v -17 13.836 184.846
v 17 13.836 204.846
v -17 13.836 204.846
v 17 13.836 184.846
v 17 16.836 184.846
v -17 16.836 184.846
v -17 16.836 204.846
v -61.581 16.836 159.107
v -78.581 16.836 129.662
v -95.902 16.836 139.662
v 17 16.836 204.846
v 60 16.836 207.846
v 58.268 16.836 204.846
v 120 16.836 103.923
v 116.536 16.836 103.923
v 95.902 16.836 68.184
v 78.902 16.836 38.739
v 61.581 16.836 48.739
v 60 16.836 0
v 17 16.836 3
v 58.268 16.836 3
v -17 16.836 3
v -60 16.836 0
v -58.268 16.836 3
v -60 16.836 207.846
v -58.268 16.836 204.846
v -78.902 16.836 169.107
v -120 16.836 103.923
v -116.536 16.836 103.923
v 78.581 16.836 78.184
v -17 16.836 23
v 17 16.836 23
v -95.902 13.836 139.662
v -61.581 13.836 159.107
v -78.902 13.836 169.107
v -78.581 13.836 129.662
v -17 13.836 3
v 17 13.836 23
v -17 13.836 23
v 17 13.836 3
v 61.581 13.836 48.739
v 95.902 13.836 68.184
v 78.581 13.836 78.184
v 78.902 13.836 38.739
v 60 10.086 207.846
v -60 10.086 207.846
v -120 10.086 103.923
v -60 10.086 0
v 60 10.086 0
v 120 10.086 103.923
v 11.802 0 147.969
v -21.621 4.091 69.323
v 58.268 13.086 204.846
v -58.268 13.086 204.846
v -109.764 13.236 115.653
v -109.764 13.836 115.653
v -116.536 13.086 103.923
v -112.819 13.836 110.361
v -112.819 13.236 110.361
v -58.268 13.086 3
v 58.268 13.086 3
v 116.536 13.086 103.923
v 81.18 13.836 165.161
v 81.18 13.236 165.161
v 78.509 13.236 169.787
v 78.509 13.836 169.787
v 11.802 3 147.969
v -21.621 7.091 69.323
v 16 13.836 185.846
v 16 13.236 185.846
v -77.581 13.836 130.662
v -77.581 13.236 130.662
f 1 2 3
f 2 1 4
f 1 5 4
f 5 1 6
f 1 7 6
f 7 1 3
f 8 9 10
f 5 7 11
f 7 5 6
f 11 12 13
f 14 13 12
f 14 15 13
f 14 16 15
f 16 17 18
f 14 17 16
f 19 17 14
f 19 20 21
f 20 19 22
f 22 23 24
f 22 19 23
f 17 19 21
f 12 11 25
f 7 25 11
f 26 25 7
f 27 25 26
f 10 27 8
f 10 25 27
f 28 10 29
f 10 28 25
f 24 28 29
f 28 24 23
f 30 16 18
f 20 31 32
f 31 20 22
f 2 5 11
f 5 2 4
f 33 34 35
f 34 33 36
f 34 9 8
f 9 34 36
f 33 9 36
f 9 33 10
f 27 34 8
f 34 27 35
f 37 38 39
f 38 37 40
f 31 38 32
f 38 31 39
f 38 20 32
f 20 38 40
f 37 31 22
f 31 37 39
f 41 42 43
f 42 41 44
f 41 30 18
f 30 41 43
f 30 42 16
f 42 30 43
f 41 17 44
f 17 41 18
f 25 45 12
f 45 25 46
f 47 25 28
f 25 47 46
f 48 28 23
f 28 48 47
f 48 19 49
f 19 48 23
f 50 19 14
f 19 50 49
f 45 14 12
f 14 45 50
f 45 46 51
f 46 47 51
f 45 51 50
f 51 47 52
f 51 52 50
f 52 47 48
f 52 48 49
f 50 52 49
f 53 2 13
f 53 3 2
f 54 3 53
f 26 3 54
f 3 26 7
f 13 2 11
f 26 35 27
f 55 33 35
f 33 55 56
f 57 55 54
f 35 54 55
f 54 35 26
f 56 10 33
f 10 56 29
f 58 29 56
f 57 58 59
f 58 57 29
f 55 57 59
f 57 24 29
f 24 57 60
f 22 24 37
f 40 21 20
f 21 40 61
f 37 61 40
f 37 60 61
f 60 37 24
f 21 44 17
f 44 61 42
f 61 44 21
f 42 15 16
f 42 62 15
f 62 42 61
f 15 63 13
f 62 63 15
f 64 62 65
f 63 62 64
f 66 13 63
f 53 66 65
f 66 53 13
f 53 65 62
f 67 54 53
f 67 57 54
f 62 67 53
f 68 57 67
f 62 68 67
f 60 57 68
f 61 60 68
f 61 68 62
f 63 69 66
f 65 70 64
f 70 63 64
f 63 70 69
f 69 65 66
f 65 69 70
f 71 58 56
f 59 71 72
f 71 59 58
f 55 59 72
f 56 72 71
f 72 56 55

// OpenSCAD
/*
    parametric_faceted_hex_wall_tile_mount_v38_original_tabs_hidden_webs.scad
    ------------------------------------------------------------
    Improved asymmetric low-poly hex wall tile.

    Major v22 changes
    -----------------
    1. ONE master thickness control drives the whole part:
       master_thickness_mm

    2. FIXED mounting tabs showing through the front face.
       - edge height now automatically provides enough cavity depth
         for the full mounting-pad thickness
       - mounting tabs and ribs are also clipped against a safe volume
         below the underside of the faceted front shell
       - tabs therefore remain hidden inside the tile


       It controls:
       - faceted front shell thickness
       - perimeter wall thickness
       - mounting-tab thickness

       Optional multipliers allow advanced tuning without hiding the
       master control.

    2. Thicker shells now work automatically.
       The effective edge height is automatically raised when required
       so shell_thickness_mm is never blocked by a too-small edge height.

    3. Mounting pads cannot protrude outside the hexagon.
       Pads are intersected with a smaller inset hex footprint.

    4. Stronger default mounting geometry.
       - 3.0 mm pad thickness
       - 4.0 mm shell overlap
       - 3.0 mm edge inset
       - optional reinforcing ribs

    5. Open back remains truly open.
       There is no rear floor across the middle.

    Recommended use
    ---------------
    For a 9-inch decorative wall tile printed vertically:

        master_thickness_mm        = 3.0;
        front_shell_multiplier      = 1.0;
        perimeter_multiplier        = 1.0;
        mount_pad_multiplier        = 1.0;
        mount_pad_overlap_mm        = 4.0;
        mount_pad_edge_inset_mm     = 3.0;
        add_mount_ribs              = true;

    Export
    ------
    F6 Render
    File -> Export -> Export as STL
*/


// =============================================================================
// CUSTOMIZER PARAMETERS
// =============================================================================


/* [Tile Size] */

// Which dimension tile_size represents.
size_reference = "across_corners";   // [flat_to_flat, across_corners]

// Units for tile_size.
size_units = "mm";                   // [mm, in]

// Examples:
// 152.4 = 6"
// 203.2 = 8"
// 228.6 = 9"
// 254.0 = 10"
tile_size = 240.0;

// Rotate finished tile around Z.
tile_rotation_deg = 15;


/* [Export / Print Orientation] */

// "flat"     = original CAD orientation.
// "vertical" = stand the tile on one complete flat hex side.
export_orientation = "vertical";          // [flat, vertical]

// Finished face uses 15 degrees. Adding another 15 degrees before standing
// gives an effective 30-degree regular-hex orientation, so a COMPLETE FLAT
// SIDE rests on the build plate.
vertical_edge_angle_deg = 15;


/* [Original Sticky Pads + Hidden Support Webs] */

// Keep the clean original v22-style four adhesive pads.
use_original_sticky_pads = true;

// Add a very thin support web from the perimeter wall up to each elevated pad.
// The web stays inside the cavity and is intended to be visually unobtrusive.
add_hidden_pad_support_webs = true;

// Web thickness in final print Y.
// 0.60 mm = roughly 1-2 extrusion lines, easy to remove if desired.
hidden_web_thickness_mm = 0.60;

// Web width in final print X near the pad.
hidden_web_width_mm = 4.0;

// Vertical drop below each pad to anchor into already-printing perimeter wall.
hidden_web_drop_mm = 18.0;

// Overlap into the mounting pad to guarantee a fused connection.
hidden_web_pad_overlap_mm = 1.0;




/* [MASTER THICKNESS] */

// MASTER MATERIAL THICKNESS.
//
// THIS is the main control to use if you want the whole printed part
// physically thicker / stronger.
//
// It directly drives:
//   - faceted front shell thickness
//   - perimeter wall thickness
//   - mounting pad thickness
//
// Recommended:
//   1.6 = light
//   2.0 = medium
//   2.5 = strong
//   3.0 = very strong / recommended for a robust wall tile
//   3.5 = heavy duty
//
master_thickness_mm = 3.0;

// Optional multipliers.
//
// Leave these at 1.0 unless you deliberately want one area stronger
// than the master value.
//
// Example:
// perimeter_multiplier = 1.20 makes a 3.0 mm master produce a
// 3.6 mm perimeter.
front_shell_multiplier = 1.0;
perimeter_multiplier   = 1.0;
mount_pad_multiplier   = 1.0;

// Derived thicknesses are calculated later from the master control.


/* [Front Relief] */

// proportional = scales with tile size
// absolute     = exact millimeter heights below
relief_height_mode = "proportional";    // [proportional, absolute]

// Overall relief multiplier.
relief_scale = 1.0;

// Main peak height relative to flat-to-flat size.
peak_height_ratio = 0.081;

// Ridge height relative to peak.
ridge_to_peak_ratio = 0.757;

// Requested outer edge height relative to peak.
//
// IMPORTANT:
// v21 automatically raises edge height if necessary to fit the selected
// front shell thickness. You normally do NOT need to change this anymore.
edge_to_peak_ratio = 0.097;

// Absolute values, used only in absolute mode.
peak_height_mm  = 18.5;
ridge_height_mm = 14.0;
edge_height_mm  = 1.8;

// Minimum empty clearance between the inner roof and Z=0 at the perimeter.
//
// v20 uses:
// effective_edge_height >= front_shell_thickness_mm + edge_clearance_mm
edge_clearance_mm = 0.60;


/* [Facet Layout] */

// Direction of main peak, CCW from +X.
peak_angle_deg = 45;

// Peak distance from center as a fraction of circumradius.
peak_radius_ratio = 0.38;

// Direction of secondary ridge.
ridge_angle_deg = 208;

// Ridge radial position.
ridge_radius_ratio = 0.34;


/* [Wall Mounting] */

// Enable mounting pads.
add_mount_pads = true;

// Width of each pad parallel to the corresponding hex side.
mount_pad_width_mm = 34.0;

// Radial depth of each pad.
mount_pad_depth_mm = 24.0;

// Mounting-tab thickness is now driven by master_thickness_mm.
// Use mount_pad_multiplier above only if the tabs need to be thicker
// or thinner than the rest of the tile.

// How far the pad reaches beneath the inner perimeter shell.
//
// More overlap creates a stronger pad-to-rim union.
mount_pad_overlap_mm = 4.0;

// Pull the ENTIRE usable pad footprint inward from the outside hex edge.
//
// Pads are clipped against this inset hex, so they cannot protrude outside.
mount_pad_edge_inset_mm = 2.0;

// Minimum air gap between the TOP of mounting geometry and the
// UNDERSIDE of the faceted front shell.
//
// This prevents tabs/ribs from becoming visible through the face.
// Recommended: 0.50-1.00 mm.
mount_face_clearance_mm = 0.75;

// Directions of mounting pads.
mount_pad_angles = [60, 120, 240, 300];


/* [Mount Reinforcement] */

// Add small triangular reinforcing ribs where pads meet the perimeter.
//
// Recommended ON for vertical printing.
add_mount_ribs = false;

// Rib thickness across the pad.
mount_rib_width_mm = 3.0;

// Rib height into the cavity.
mount_rib_height_mm = 5.0;

// Rib radial depth.
mount_rib_depth_mm = 8.0;


/* [Optional Screw Holes] */

add_pad_screw_holes = false;

// 3.5 ~= #6
// 4.5 ~= #8
pad_screw_hole_diameter_mm = 4.5;


/* [Advanced] */

// Polyhedron preview hint.
polyhedron_convexity = 12;

// Cylinder quality for screw holes.
screw_hole_fn = 40;


// =============================================================================
// DERIVED MATERIAL THICKNESSES
// =============================================================================
//
// These are the ACTUAL thicknesses used by the model.
//

front_shell_thickness_mm =
    master_thickness_mm * front_shell_multiplier;

perimeter_wall_thickness_mm =
    master_thickness_mm * perimeter_multiplier;

mount_pad_thickness_mm =
    master_thickness_mm * mount_pad_multiplier;


// =============================================================================
// DERIVED TILE DIMENSIONS
// =============================================================================

_tile_size_mm =
    size_units == "in"
        ? tile_size * 25.4
        : tile_size;

tile_flat_to_flat =
    size_reference == "flat_to_flat"
        ? _tile_size_mm
        : _tile_size_mm * cos(30);

tile_across_corners =
    tile_flat_to_flat / cos(30);

outer_apothem =
    tile_flat_to_flat / 2;

r_outer =
    outer_apothem / cos(30);

inner_apothem =
    outer_apothem - perimeter_wall_thickness_mm;

r_inner =
    inner_apothem / cos(30);

inner_flat_length =
    2 * inner_apothem * tan(30);

hex_side_length =
    2 * r_outer * sin(30);


// =============================================================================
// DERIVED VERTICAL-PRINT GEOMETRY
// =============================================================================

vertical_total_rotation_deg =
    tile_rotation_deg + vertical_edge_angle_deg;

vertical_half_y =
    max([
        for (i = [0 : 5])
            abs(
                r_outer
                * sin(
                    30
                    + i * 60
                    + vertical_total_rotation_deg
                )
            )
    ]);

vertical_print_height =
    2 * vertical_half_y;


function vertical_hex_half_width_at_z(z_mm) =
    let(
        zc = min(max(z_mm, 0), vertical_print_height),
        dz = min(zc, vertical_print_height - zc)
    )
    hex_side_length / 2 + dz / tan(60);

// Final-print X/Z position of a raw legacy mount-pad corner.
function legacy_pad_print_corner(angle_deg, radial_r, lateral_t) =
    let(
        theta =
            angle_deg
            + tile_rotation_deg
            + vertical_edge_angle_deg
    )
    [
        radial_r * cos(theta) - lateral_t * sin(theta),

        vertical_half_y
            + radial_r * sin(theta)
            + lateral_t * cos(theta)
    ];

function legacy_pad_print_corners(angle_deg) =
    [
        legacy_pad_print_corner(
            angle_deg,
            mount_pad_inner_r,
            -mount_pad_width_mm / 2
        ),
        legacy_pad_print_corner(
            angle_deg,
            mount_pad_inner_r,
             mount_pad_width_mm / 2
        ),
        legacy_pad_print_corner(
            angle_deg,
            mount_pad_desired_outer_r,
            -mount_pad_width_mm / 2
        ),
        legacy_pad_print_corner(
            angle_deg,
            mount_pad_desired_outer_r,
             mount_pad_width_mm / 2
        )
    ];

function legacy_pad_corner_zs(angle_deg) =
    [
        for (p = legacy_pad_print_corners(angle_deg))
            p[1]
    ];

function legacy_pad_lowest_z(angle_deg) =
    min(legacy_pad_corner_zs(angle_deg));

function legacy_pad_lowest_index(angle_deg) =
    search(
        legacy_pad_lowest_z(angle_deg),
        legacy_pad_corner_zs(angle_deg)
    )[0];

function legacy_pad_lowest_x(angle_deg) =
    legacy_pad_print_corners(angle_deg)[
        legacy_pad_lowest_index(angle_deg)
    ][0];



// =============================================================================
// DERIVED RELIEF HEIGHTS
// =============================================================================

_peak_unscaled =
    relief_height_mode == "proportional"
        ? tile_flat_to_flat * peak_height_ratio
        : peak_height_mm;

_ridge_unscaled =
    relief_height_mode == "proportional"
        ? _peak_unscaled * ridge_to_peak_ratio
        : ridge_height_mm;

_requested_edge_unscaled =
    relief_height_mode == "proportional"
        ? _peak_unscaled * edge_to_peak_ratio
        : edge_height_mm;

peak_height =
    _peak_unscaled * relief_scale;

ridge_height =
    _ridge_unscaled * relief_scale;

requested_edge_height =
    _requested_edge_unscaled * relief_scale;

// AUTO-FIX:
// Guarantee enough vertical room for BOTH:
//   1. the chosen front-shell thickness
//   2. the full mounting-pad thickness
//
// This is the key v22 fix for tabs previously breaking through the face.
minimum_edge_height =
    front_shell_thickness_mm
    + mount_pad_thickness_mm
    + mount_face_clearance_mm;

edge_height =
    max(
        requested_edge_height,
        minimum_edge_height
    );


// =============================================================================
// DERIVED MOUNTING GEOMETRY
// =============================================================================

// Desired outer edge before clipping.
//
// This allows the pad to overlap the inner wall structurally.
mount_pad_desired_outer_r =
    inner_apothem + mount_pad_overlap_mm;

mount_pad_inner_r =
    mount_pad_desired_outer_r - mount_pad_depth_mm;

mount_pad_center_r =
    mount_pad_desired_outer_r - mount_pad_depth_mm / 2;

// Smaller hex used as a hard clipping boundary.
//
// Any mount geometry outside this boundary is removed automatically.
mount_clip_apothem =
    outer_apothem - mount_pad_edge_inset_mm;

mount_clip_radius =
    mount_clip_apothem / cos(30);


// =============================================================================
// VALIDATION
// =============================================================================

assert(
    tile_flat_to_flat > 0,
    "tile_size must produce a positive tile dimension."
);

assert(
    master_thickness_mm > 0,
    "master_thickness_mm must be greater than zero."
);

assert(
    front_shell_multiplier > 0 &&
    perimeter_multiplier > 0 &&
    mount_pad_multiplier > 0,
    "All thickness multipliers must be greater than zero."
);

assert(
    front_shell_thickness_mm > 0,
    "front_shell_thickness_mm must be greater than zero."
);

assert(
    perimeter_wall_thickness_mm > 0,
    "perimeter_wall_thickness_mm must be greater than zero."
);

assert(
    perimeter_wall_thickness_mm < outer_apothem,
    "perimeter_wall_thickness_mm is too large for this tile."
);

assert(
    inner_apothem > 0,
    "The selected perimeter wall leaves no hollow interior."
);

assert(
    edge_height > front_shell_thickness_mm,
    "Internal error: edge_height must exceed front_shell_thickness_mm."
);

assert(
    ridge_height > edge_height,
    "ridge_height must remain greater than the effective edge height."
);

assert(
    peak_height > ridge_height,
    "peak_height must remain greater than ridge_height."
);

assert(
    peak_radius_ratio > 0 && peak_radius_ratio < 0.90,
    "peak_radius_ratio must be between 0 and 0.90."
);

assert(
    ridge_radius_ratio > 0 && ridge_radius_ratio < 0.90,
    "ridge_radius_ratio must be between 0 and 0.90."
);

assert(
    mount_pad_width_mm > 0,
    "mount_pad_width_mm must be greater than zero."
);

assert(
    mount_pad_depth_mm > 0,
    "mount_pad_depth_mm must be greater than zero."
);

assert(
    mount_pad_thickness_mm > 0,
    "mount_pad_thickness_mm must be greater than zero."
);

assert(
    mount_pad_overlap_mm >= 0,
    "mount_pad_overlap_mm cannot be negative."
);

assert(
    mount_pad_edge_inset_mm >= 0,
    "mount_pad_edge_inset_mm cannot be negative."
);

assert(
    mount_face_clearance_mm >= 0,
    "mount_face_clearance_mm cannot be negative."
);

assert(
    mount_clip_apothem > 0,
    "mount_pad_edge_inset_mm is too large."
);

assert(
    mount_pad_inner_r > 0,
    "mount_pad_depth_mm is too large and reaches/passes the tile center."
);

assert(
    !add_pad_screw_holes ||
    pad_screw_hole_diameter_mm < mount_pad_width_mm * 0.75,
    "pad_screw_hole_diameter_mm is too large for the mounting pad."
);

assert(
    !add_mount_ribs ||
    mount_rib_height_mm > 0,
    "mount_rib_height_mm must be greater than zero."
);


assert(
    hidden_web_thickness_mm > 0,
    "hidden_web_thickness_mm must be greater than zero."
);

assert(
    hidden_web_width_mm > 0,
    "hidden_web_width_mm must be greater than zero."
);

assert(
    hidden_web_drop_mm > 0,
    "hidden_web_drop_mm must be greater than zero."
);


// =============================================================================
// DIAGNOSTIC OUTPUT
// =============================================================================

echo("====================================================");
echo("FACETED HEX WALL TILE v22");
echo("====================================================");

echo(str("flat-to-flat             : ", tile_flat_to_flat, " mm"));
echo(str("across-corners           : ", tile_across_corners, " mm"));
echo(str("hex side length          : ", hex_side_length, " mm"));

echo(str("MASTER thickness         : ", master_thickness_mm, " mm"));
echo(str("actual front shell       : ", front_shell_thickness_mm, " mm"));
echo(str("actual perimeter wall    : ", perimeter_wall_thickness_mm, " mm"));
echo(str("actual mount pad         : ", mount_pad_thickness_mm, " mm"));
echo(str("perimeter wall thickness : ", perimeter_wall_thickness_mm, " mm"));

echo(str("requested edge height    : ", requested_edge_height, " mm"));
echo(str("minimum edge height      : ", minimum_edge_height, " mm"));
echo(str("EFFECTIVE edge height    : ", edge_height, " mm"));

echo(str("ridge height             : ", ridge_height, " mm"));
echo(str("peak height              : ", peak_height, " mm"));
echo(str("export orientation       : ", export_orientation));
echo(str("vertical print height    : ", vertical_print_height, " mm"));
echo(str("vertical relief depth    : ", peak_height, " mm"));
echo(str("effective print rotation : ", vertical_total_rotation_deg, " deg"));
echo(str("original sticky pads     : ", use_original_sticky_pads));
echo(str("hidden support webs      : ", add_hidden_pad_support_webs));
echo(str("hidden web thickness     : ", hidden_web_thickness_mm, " mm"));
echo(str("hidden web drop          : ", hidden_web_drop_mm, " mm"));

echo(str("mount pad width          : ", mount_pad_width_mm, " mm"));
echo(str("mount pad depth          : ", mount_pad_depth_mm, " mm"));
echo(str("mount pad thickness      : ", mount_pad_thickness_mm, " mm"));
echo(str("mount pad overlap        : ", mount_pad_overlap_mm, " mm"));
echo(str("mount edge inset         : ", mount_pad_edge_inset_mm, " mm"));
echo(str("mount/face clearance     : ", mount_face_clearance_mm, " mm"));

echo(str("mount clip apothem       : ", mount_clip_apothem, " mm"));

if (edge_height > requested_edge_height)
    echo(
        str(
            "AUTO EDGE FIX ACTIVE: edge raised from ",
            requested_edge_height,
            " mm to ",
            edge_height,
            " mm so a ",
            front_shell_thickness_mm,
            " mm front shell and ", mount_pad_thickness_mm, " mm mounting tabs fit safely."
        )
    );

echo("====================================================");


// =============================================================================
// HELPERS
// =============================================================================

function polar(angle_deg, radius) =
    [
        radius * cos(angle_deg),
        radius * sin(angle_deg)
    ];

function hex_vertex(i, radius) =
    [
        radius * cos(30 + i * 60),
        radius * sin(30 + i * 60)
    ];


// =============================================================================
// FRONT RELIEF CONTROL POINTS
// =============================================================================

P_xy =
    polar(
        peak_angle_deg,
        r_outer * peak_radius_ratio
    );

Q_xy =
    polar(
        ridge_angle_deg,
        r_outer * ridge_radius_ratio
    );


// =============================================================================
// SHELL VERTICES
// =============================================================================

points =
    concat(

        // 0..5 : outer rear perimeter
        [
            for (i = [0 : 5])
                let(p = hex_vertex(i, r_outer))
                [p[0], p[1], 0]
        ],

        // 6..11 : outer front perimeter
        [
            for (i = [0 : 5])
                let(p = hex_vertex(i, r_outer))
                [p[0], p[1], edge_height]
        ],

        // 12..13 : outer peak / ridge
        [
            [P_xy[0], P_xy[1], peak_height],
            [Q_xy[0], Q_xy[1], ridge_height]
        ],

        // 14..19 : inner rear perimeter
        [
            for (i = [0 : 5])
                let(p = hex_vertex(i, r_inner))
                [p[0], p[1], 0]
        ],

        // 20..25 : inner front perimeter
        [
            for (i = [0 : 5])
                let(p = hex_vertex(i, r_inner))
                [p[0], p[1], edge_height - front_shell_thickness_mm]
        ],

        // 26..27 : inner peak / ridge
        [
            [P_xy[0], P_xy[1], peak_height - front_shell_thickness_mm],
            [Q_xy[0], Q_xy[1], ridge_height - front_shell_thickness_mm]
        ]
    );


// =============================================================================
// SHELL FACES
// =============================================================================

outer_roof_faces = [
    [6, 7, 12],
    [7, 8, 12],
    [6, 12, 11],

    [8, 13, 12],
    [11, 12, 13],

    [8, 9, 13],
    [9, 10, 13],
    [10, 11, 13]
];

inner_roof_faces = [
    [26, 21, 20],
    [26, 22, 21],
    [25, 26, 20],

    [26, 27, 22],
    [27, 26, 25],

    [27, 23, 22],
    [27, 24, 23],
    [27, 25, 24]
];

faces =
    concat(

        // Outer vertical perimeter
        [
            for (i = [0 : 5])
                [
                    i,
                    (i + 1) % 6,
                    6 + (i + 1) % 6,
                    6 + i
                ]
        ],

        outer_roof_faces,

        // Inner vertical perimeter
        [
            for (i = [0 : 5])
                [
                    14 + i,
                    20 + i,
                    20 + (i + 1) % 6,
                    14 + (i + 1) % 6
                ]
        ],

        inner_roof_faces,

        // Narrow rear perimeter ring only.
        // Center remains open.
        [
            for (i = [0 : 5])
                [
                    i,
                    14 + i,
                    14 + (i + 1) % 6,
                    (i + 1) % 6
                ]
        ]
    );


// =============================================================================
// TILE SHELL
// =============================================================================

module tile_shell() {
    polyhedron(
        points = points,
        faces = faces,
        convexity = polyhedron_convexity
    );
}


// =============================================================================
// SAFE MOUNTING VOLUME BELOW THE FRONT FACE
// =============================================================================
//
// This volume follows the UNDERSIDE of the faceted front shell, offset
// downward by mount_face_clearance_mm.
//
// Mount pads and ribs are intersected with this volume. Even if a future
// parameter combination becomes aggressive, mounting geometry cannot pass
// through the visible front shell.
//

safe_edge_z =
    max(
        0.01,
        edge_height
        - front_shell_thickness_mm
        - mount_face_clearance_mm
    );

safe_peak_z =
    max(
        0.01,
        peak_height
        - front_shell_thickness_mm
        - mount_face_clearance_mm
    );

safe_ridge_z =
    max(
        0.01,
        ridge_height
        - front_shell_thickness_mm
        - mount_face_clearance_mm
    );

safe_mount_points =
    concat(

        // 0..5: rear outer perimeter
        [
            for (i = [0 : 5])
                let(p = hex_vertex(i, r_outer))
                [p[0], p[1], 0]
        ],

        // 6..11: safe ceiling at outer perimeter
        [
            for (i = [0 : 5])
                let(p = hex_vertex(i, r_outer))
                [p[0], p[1], safe_edge_z]
        ],

        // 12..13: safe ceiling under peak/ridge
        [
            [P_xy[0], P_xy[1], safe_peak_z],
            [Q_xy[0], Q_xy[1], safe_ridge_z]
        ]
    );

safe_mount_ceiling_faces = [
    [6, 7, 12],
    [7, 8, 12],
    [6, 12, 11],
    [8, 13, 12],
    [11, 12, 13],
    [8, 9, 13],
    [9, 10, 13],
    [10, 11, 13]
];

safe_mount_faces =
    concat(

        // Outer side walls.
        [
            for (i = [0 : 5])
                [
                    i,
                    (i + 1) % 6,
                    6 + (i + 1) % 6,
                    6 + i
                ]
        ],

        // Sloped safe ceiling.
        safe_mount_ceiling_faces,

        // Rear floor used only as a clipping volume closure.
        [[5, 4, 3, 2, 1, 0]]
    );

module safe_mount_volume() {
    polyhedron(
        points = safe_mount_points,
        faces = safe_mount_faces,
        convexity = polyhedron_convexity
    );
}


// =============================================================================
// HEX FOOTPRINT USED TO CLIP MOUNTING TABS
// =============================================================================
//
// This is intentionally smaller than the visible outer hexagon.
// Therefore mount pads/ribs cannot stick out past the visible perimeter.
//

module mount_clip_volume(height_mm) {
    linear_extrude(height = height_mm)
        polygon(
            points = [
                for (i = [0 : 5])
                    hex_vertex(i, mount_clip_radius)
            ]
        );
}


// =============================================================================
// RAW MOUNT PAD
// =============================================================================

module raw_mount_pad(angle_deg) {
    rotate([0, 0, angle_deg])
        translate(
            [
                mount_pad_inner_r,
                -mount_pad_width_mm / 2,
                0
            ]
        )
            cube(
                [
                    mount_pad_depth_mm,
                    mount_pad_width_mm,
                    mount_pad_thickness_mm
                ]
            );
}


// =============================================================================
// CLIPPED MOUNT PAD
// =============================================================================

module mount_pad(angle_deg) {
    intersection() {

        raw_mount_pad(angle_deg);

        // Keep pad inside the inset hex footprint.
        mount_clip_volume(
            mount_pad_thickness_mm + 0.01
        );

        // Hard stop below the underside of the front face.
        safe_mount_volume();
    }
}


// =============================================================================
// OPTIONAL REINFORCING RIBS
// =============================================================================
//
// Two ribs are placed near the left/right sides of each mounting pad.
//
// They rise into the cavity and help resist bending at the pad-to-shell joint.
//

module raw_mount_ribs(angle_deg) {

    rib_center_r =
        mount_pad_desired_outer_r
        - mount_rib_depth_mm / 2;

    rib_side_offset =
        max(
            0,
            mount_pad_width_mm / 2
            - mount_rib_width_mm
            - 2
        );

    rotate([0, 0, angle_deg]) {

        for (side = [-1, 1]) {

            translate(
                [
                    rib_center_r - mount_rib_depth_mm / 2,
                    side * rib_side_offset - mount_rib_width_mm / 2,
                    mount_pad_thickness_mm
                ]
            )

            rotate([90, 0, 90])

            linear_extrude(height = mount_rib_depth_mm)

            polygon(
                points = [
                    [0, 0],
                    [mount_rib_width_mm, 0],
                    [mount_rib_width_mm, mount_rib_height_mm],
                    [0, 0]
                ]
            );
        }
    }
}


module mount_ribs(angle_deg) {
    intersection() {

        raw_mount_ribs(angle_deg);

        mount_clip_volume(
            mount_pad_thickness_mm
            + mount_rib_height_mm
            + 0.1
        );

        // Ribs are also prohibited from crossing the front-shell underside.
        safe_mount_volume();
    }
}


// =============================================================================
// OPTIONAL SCREW HOLE
// =============================================================================

module pad_screw_hole(angle_deg) {

    rotate([0, 0, angle_deg])

        translate(
            [
                mount_pad_center_r,
                0,
                -1
            ]
        )

            cylinder(
                d = pad_screw_hole_diameter_mm,
                h =
                    mount_pad_thickness_mm
                    + mount_rib_height_mm
                    + 2,
                $fn = screw_hole_fn
            );
}


// =============================================================================
// COMPLETE MODEL
// =============================================================================

module model() {

    rotate([0, 0, tile_rotation_deg]) {

        difference() {

            union() {

                tile_shell();

                if (add_mount_pads) {

                    for (a = mount_pad_angles) {

                        mount_pad(a);

                        if (add_mount_ribs)
                            mount_ribs(a);
                    }
                }
            }

            if (
                add_mount_pads &&
                add_pad_screw_holes
            ) {

                for (a = mount_pad_angles)
                    pad_screw_hole(a);
            }
        }
    }
}


// =============================================================================
// HIDDEN WALL-HUGGING SUPPORT WEBS FOR ORIGINAL STICKY PADS
// =============================================================================
//
// The original v22 pads are retained unchanged.
//
// Only pads whose lowest print point is above the build plate get a support web.
// The web is:
// - very thin in Y
// - narrow in X
// - anchored against the nearest inside perimeter wall
// - sloped upward toward the pad
// - entirely inside the cavity
//
// This avoids the huge rails / odd tabs from later experiments.

module xz_web_prism(points_xz, y_start, y_depth) {

    translate([0, y_start + y_depth, 0])

        rotate([90, 0, 0])

            linear_extrude(
                height = y_depth,
                convexity = 8
            )

                polygon(
                    points = points_xz
                );
}


module hidden_support_web_for_pad(angle_deg) {

    pad_z =
        legacy_pad_lowest_z(angle_deg);

    pad_x =
        legacy_pad_lowest_x(angle_deg);

    // Only support pads that begin above the plate.
    if (pad_z > 1.0) {

        side_sign =
            pad_x < 0 ? -1 : 1;

        anchor_z =
            max(
                0.4,
                pad_z - hidden_web_drop_mm
            );

        shell_half =
            vertical_hex_half_width_at_z(anchor_z);

        shell_x =
            side_sign
            * (
                shell_half
                - perimeter_wall_thickness_mm / 2
            );

        // Move web tip slightly into the pad for a guaranteed union.
        tip_x =
            pad_x
            - side_sign * hidden_web_pad_overlap_mm;

        tip_z =
            pad_z
            + hidden_web_pad_overlap_mm;

        // Small short base against the perimeter wall.
        base_half =
            hidden_web_width_mm / 2;

        pts =
            side_sign > 0
                ? [
                    [shell_x, anchor_z - base_half],
                    [shell_x, anchor_z + base_half],
                    [tip_x, tip_z]
                  ]
                : [
                    [shell_x, anchor_z - base_half],
                    [tip_x, tip_z],
                    [shell_x, anchor_z + base_half]
                  ];

        // Place web on cavity-facing side of the rear pad.
        xz_web_prism(
            pts,
            peak_height
                - mount_pad_thickness_mm
                - hidden_web_thickness_mm,
            hidden_web_thickness_mm
        );
    }
}


module hidden_pad_support_webs() {

    if (
        export_orientation == "vertical"
        && add_mount_pads
        && add_hidden_pad_support_webs
    ) {
        for (a = mount_pad_angles)
            hidden_support_web_for_pad(a);
    }
}


// =============================================================================
// OUTPUT
// =============================================================================
//
// v38 ORIGINAL TABS + HIDDEN WALL-HUGGING WEBS:
// - exact v22-style hidden rectangular sticky pads
// - no stabilizer feet
// - no sacrificial fins
// - no gussets
// - no native vertical replacement pads
// - no screw holes
// - no mount ribs
//
// The model remains a true regular hex. For vertical export, it is stood on a
// complete flat side and translated so the bottom edge sits at Z=0.

module output_model() {

    if (export_orientation == "vertical") {

        union() {

            // Exact original v22/v34 shell + original four adhesive pads.
            translate(
                [
                    0,
                    peak_height,
                    vertical_half_y
                ]
            )

            rotate([90, 0, 0])

            rotate([0, 0, vertical_edge_angle_deg])

                model();

            // Add only the minimal hidden print-support webs.
            hidden_pad_support_webs();
        }

    } else {

        model();
    }
}

output_model();
